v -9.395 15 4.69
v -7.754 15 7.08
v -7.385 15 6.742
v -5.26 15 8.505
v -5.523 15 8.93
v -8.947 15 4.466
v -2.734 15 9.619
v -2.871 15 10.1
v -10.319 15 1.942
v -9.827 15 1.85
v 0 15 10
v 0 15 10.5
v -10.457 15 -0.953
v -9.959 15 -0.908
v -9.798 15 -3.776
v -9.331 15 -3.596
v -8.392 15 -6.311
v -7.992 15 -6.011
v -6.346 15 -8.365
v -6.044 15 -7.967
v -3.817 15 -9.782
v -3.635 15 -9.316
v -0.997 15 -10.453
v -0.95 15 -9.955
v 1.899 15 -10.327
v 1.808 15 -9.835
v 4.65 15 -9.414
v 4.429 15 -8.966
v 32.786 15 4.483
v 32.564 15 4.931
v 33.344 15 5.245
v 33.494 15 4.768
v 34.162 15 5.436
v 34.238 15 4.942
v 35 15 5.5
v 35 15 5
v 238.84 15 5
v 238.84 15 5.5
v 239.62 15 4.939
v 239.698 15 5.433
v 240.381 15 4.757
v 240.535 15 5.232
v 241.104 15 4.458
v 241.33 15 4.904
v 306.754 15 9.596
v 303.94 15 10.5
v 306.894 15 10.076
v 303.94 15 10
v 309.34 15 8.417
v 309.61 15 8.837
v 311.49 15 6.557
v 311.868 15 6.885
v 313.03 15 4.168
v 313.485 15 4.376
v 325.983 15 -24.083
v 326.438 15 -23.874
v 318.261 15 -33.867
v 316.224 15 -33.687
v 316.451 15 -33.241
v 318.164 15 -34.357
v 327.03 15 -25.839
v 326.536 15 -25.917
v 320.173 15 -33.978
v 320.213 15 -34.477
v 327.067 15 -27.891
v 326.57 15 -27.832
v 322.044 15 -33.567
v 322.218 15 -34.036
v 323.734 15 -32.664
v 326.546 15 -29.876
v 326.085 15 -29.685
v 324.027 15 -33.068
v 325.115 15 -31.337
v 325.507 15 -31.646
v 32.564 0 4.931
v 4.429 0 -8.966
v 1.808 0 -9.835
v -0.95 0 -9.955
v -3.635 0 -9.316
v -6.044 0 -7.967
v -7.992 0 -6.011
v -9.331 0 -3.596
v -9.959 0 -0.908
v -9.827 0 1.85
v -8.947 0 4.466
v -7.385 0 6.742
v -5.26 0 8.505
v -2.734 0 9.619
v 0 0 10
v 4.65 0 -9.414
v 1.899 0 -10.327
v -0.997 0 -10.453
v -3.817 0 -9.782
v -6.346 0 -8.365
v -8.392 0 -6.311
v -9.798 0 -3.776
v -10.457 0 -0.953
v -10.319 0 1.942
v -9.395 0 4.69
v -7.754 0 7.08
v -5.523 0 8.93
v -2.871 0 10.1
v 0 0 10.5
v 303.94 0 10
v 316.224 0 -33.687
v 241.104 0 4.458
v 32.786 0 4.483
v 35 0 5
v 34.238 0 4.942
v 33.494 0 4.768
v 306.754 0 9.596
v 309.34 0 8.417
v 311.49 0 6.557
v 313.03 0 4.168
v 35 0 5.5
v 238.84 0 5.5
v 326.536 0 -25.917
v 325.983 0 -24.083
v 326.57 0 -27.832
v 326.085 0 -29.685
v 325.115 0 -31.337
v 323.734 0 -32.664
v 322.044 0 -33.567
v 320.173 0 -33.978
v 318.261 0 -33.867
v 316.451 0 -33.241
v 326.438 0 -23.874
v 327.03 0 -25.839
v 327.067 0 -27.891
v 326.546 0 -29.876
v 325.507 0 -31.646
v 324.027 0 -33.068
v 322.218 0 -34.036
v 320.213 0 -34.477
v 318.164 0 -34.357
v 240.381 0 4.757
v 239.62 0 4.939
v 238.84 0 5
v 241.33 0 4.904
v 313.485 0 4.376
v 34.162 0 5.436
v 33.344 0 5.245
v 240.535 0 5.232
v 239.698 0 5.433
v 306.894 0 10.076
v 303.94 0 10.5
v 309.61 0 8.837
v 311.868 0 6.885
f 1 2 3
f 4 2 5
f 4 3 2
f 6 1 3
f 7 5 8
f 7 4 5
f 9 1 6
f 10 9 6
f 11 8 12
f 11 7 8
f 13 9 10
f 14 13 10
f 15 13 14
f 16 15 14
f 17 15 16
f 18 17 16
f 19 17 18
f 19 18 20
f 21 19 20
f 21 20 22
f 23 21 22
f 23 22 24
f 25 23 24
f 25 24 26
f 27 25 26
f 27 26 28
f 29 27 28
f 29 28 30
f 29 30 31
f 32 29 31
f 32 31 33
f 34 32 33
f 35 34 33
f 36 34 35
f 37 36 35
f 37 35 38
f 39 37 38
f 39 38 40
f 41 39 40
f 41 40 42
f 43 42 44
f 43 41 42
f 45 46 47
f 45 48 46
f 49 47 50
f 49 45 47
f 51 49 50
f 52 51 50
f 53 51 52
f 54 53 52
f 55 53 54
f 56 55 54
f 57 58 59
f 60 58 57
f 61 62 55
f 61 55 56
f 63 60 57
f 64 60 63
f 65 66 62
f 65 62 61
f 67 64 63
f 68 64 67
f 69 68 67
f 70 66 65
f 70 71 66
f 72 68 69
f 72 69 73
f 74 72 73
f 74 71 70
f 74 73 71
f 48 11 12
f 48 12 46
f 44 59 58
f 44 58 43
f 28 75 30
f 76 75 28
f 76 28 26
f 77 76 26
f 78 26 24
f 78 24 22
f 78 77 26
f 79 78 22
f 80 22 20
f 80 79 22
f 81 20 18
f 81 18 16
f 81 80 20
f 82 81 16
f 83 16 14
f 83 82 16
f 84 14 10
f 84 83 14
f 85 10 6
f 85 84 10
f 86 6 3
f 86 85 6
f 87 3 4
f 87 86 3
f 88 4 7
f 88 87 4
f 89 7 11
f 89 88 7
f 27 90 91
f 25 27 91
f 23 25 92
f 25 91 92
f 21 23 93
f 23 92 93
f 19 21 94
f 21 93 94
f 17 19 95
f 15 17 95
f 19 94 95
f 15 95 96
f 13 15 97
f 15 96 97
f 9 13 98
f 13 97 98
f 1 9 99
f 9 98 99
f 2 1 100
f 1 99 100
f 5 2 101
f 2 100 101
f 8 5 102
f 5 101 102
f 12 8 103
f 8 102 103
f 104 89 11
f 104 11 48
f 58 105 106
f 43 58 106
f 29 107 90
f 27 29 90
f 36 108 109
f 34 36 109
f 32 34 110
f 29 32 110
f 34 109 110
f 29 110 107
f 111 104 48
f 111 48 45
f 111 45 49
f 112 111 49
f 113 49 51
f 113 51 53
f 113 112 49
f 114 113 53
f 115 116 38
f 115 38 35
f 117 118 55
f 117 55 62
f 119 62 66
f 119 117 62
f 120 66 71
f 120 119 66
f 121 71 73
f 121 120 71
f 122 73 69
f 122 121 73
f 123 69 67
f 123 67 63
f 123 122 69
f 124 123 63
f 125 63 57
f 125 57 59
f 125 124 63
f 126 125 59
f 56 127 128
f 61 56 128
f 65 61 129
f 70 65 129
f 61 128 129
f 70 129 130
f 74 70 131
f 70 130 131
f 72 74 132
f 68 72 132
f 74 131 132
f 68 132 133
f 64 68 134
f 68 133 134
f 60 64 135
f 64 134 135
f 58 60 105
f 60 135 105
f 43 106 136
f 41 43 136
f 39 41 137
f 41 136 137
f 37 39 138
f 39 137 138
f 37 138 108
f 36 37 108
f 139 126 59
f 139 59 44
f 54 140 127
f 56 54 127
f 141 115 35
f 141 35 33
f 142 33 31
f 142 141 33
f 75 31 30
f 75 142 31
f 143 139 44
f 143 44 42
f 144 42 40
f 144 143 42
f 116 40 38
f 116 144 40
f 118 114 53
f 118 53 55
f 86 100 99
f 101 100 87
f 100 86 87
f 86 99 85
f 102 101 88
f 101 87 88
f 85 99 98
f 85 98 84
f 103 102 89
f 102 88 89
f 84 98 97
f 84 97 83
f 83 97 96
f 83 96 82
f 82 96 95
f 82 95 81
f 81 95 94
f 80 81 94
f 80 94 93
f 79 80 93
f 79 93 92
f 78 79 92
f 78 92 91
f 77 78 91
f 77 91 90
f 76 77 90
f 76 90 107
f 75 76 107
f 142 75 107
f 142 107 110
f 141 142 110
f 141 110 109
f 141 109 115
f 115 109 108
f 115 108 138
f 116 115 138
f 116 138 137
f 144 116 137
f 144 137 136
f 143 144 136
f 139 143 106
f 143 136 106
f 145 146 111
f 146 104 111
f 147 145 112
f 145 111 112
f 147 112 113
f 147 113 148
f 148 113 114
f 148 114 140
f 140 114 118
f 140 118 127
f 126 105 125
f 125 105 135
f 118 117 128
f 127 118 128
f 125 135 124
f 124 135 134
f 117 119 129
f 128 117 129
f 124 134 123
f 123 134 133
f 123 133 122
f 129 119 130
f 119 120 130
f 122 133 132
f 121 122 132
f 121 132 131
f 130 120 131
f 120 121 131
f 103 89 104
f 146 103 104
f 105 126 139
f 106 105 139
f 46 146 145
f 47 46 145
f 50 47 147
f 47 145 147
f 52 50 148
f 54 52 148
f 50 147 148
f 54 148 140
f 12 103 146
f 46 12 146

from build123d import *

# Parameters (mm, degrees)
BOSS_EXTRUDE1_DEPTH = 15


with BuildPart() as part:
    # Sketch1 → Boss-Extrude1 (new body)
    with BuildSketch(Plane(origin=(0, 0, 0), x_dir=(1, 0, 0), z_dir=(0, 1, 0))):
        with BuildLine():
            Line((238.84, -5), (35, -5))
            ThreePointArc((35, -5), (33.863075353, -4.869024784), (32.785714286, -4.482960938))
            Line((32.785714286, -4.482960938), (4.65, 9.414217971))
            ThreePointArc((4.65, 9.414217971), (-10.224952046, 2.38754176), (0, -10.5))
            Line((0, -10.5), (303.94, -10.5))
            ThreePointArc((303.94, -10.5), (309.61007222, -8.837436338), (313.484552814, -4.376244004))
            Line((313.484552814, -4.376244004), (326.437537724, 23.874111425))
            ThreePointArc((326.437537724, 23.874111425), (324.816305533, 32.408179805), (316.224290262, 33.687238247))
            Line((316.224290262, 33.687238247), (241.103806492, -4.458158831))
            ThreePointArc((241.103806492, -4.458158831), (240.0038741, -4.862653296), (238.84, -5))
        make_face()
        with BuildLine():
            Line((0, -10), (303.94, -10))
            ThreePointArc((303.94, -10), (309.340068781, -8.416606036), (313.030050299, -4.167851433))
            Line((313.030050299, -4.167851433), (325.983035209, 24.082503997))
            ThreePointArc((325.983035209, 24.082503997), (324.469885164, 32.047634485), (316.450670911, 33.241422364))
            Line((316.450670911, 33.241422364), (241.330187142, -4.903974714))
            ThreePointArc((241.330187142, -4.903974714), (240.12026151, -5.348918626), (238.84, -5.5))
            Line((238.84, -5.5), (35, -5.5))
            ThreePointArc((35, -5.5), (33.749382888, -5.355927262), (32.564285714, -4.931257032))
            Line((32.564285714, -4.931257032), (4.428571429, 8.965921877))
            ThreePointArc((4.428571429, 8.965921877), (-9.738049568, 2.273849295), (0, -10))
        make_face(mode=Mode.SUBTRACT)
    extrude(amount=BOSS_EXTRUDE1_DEPTH)


solid = part.part
